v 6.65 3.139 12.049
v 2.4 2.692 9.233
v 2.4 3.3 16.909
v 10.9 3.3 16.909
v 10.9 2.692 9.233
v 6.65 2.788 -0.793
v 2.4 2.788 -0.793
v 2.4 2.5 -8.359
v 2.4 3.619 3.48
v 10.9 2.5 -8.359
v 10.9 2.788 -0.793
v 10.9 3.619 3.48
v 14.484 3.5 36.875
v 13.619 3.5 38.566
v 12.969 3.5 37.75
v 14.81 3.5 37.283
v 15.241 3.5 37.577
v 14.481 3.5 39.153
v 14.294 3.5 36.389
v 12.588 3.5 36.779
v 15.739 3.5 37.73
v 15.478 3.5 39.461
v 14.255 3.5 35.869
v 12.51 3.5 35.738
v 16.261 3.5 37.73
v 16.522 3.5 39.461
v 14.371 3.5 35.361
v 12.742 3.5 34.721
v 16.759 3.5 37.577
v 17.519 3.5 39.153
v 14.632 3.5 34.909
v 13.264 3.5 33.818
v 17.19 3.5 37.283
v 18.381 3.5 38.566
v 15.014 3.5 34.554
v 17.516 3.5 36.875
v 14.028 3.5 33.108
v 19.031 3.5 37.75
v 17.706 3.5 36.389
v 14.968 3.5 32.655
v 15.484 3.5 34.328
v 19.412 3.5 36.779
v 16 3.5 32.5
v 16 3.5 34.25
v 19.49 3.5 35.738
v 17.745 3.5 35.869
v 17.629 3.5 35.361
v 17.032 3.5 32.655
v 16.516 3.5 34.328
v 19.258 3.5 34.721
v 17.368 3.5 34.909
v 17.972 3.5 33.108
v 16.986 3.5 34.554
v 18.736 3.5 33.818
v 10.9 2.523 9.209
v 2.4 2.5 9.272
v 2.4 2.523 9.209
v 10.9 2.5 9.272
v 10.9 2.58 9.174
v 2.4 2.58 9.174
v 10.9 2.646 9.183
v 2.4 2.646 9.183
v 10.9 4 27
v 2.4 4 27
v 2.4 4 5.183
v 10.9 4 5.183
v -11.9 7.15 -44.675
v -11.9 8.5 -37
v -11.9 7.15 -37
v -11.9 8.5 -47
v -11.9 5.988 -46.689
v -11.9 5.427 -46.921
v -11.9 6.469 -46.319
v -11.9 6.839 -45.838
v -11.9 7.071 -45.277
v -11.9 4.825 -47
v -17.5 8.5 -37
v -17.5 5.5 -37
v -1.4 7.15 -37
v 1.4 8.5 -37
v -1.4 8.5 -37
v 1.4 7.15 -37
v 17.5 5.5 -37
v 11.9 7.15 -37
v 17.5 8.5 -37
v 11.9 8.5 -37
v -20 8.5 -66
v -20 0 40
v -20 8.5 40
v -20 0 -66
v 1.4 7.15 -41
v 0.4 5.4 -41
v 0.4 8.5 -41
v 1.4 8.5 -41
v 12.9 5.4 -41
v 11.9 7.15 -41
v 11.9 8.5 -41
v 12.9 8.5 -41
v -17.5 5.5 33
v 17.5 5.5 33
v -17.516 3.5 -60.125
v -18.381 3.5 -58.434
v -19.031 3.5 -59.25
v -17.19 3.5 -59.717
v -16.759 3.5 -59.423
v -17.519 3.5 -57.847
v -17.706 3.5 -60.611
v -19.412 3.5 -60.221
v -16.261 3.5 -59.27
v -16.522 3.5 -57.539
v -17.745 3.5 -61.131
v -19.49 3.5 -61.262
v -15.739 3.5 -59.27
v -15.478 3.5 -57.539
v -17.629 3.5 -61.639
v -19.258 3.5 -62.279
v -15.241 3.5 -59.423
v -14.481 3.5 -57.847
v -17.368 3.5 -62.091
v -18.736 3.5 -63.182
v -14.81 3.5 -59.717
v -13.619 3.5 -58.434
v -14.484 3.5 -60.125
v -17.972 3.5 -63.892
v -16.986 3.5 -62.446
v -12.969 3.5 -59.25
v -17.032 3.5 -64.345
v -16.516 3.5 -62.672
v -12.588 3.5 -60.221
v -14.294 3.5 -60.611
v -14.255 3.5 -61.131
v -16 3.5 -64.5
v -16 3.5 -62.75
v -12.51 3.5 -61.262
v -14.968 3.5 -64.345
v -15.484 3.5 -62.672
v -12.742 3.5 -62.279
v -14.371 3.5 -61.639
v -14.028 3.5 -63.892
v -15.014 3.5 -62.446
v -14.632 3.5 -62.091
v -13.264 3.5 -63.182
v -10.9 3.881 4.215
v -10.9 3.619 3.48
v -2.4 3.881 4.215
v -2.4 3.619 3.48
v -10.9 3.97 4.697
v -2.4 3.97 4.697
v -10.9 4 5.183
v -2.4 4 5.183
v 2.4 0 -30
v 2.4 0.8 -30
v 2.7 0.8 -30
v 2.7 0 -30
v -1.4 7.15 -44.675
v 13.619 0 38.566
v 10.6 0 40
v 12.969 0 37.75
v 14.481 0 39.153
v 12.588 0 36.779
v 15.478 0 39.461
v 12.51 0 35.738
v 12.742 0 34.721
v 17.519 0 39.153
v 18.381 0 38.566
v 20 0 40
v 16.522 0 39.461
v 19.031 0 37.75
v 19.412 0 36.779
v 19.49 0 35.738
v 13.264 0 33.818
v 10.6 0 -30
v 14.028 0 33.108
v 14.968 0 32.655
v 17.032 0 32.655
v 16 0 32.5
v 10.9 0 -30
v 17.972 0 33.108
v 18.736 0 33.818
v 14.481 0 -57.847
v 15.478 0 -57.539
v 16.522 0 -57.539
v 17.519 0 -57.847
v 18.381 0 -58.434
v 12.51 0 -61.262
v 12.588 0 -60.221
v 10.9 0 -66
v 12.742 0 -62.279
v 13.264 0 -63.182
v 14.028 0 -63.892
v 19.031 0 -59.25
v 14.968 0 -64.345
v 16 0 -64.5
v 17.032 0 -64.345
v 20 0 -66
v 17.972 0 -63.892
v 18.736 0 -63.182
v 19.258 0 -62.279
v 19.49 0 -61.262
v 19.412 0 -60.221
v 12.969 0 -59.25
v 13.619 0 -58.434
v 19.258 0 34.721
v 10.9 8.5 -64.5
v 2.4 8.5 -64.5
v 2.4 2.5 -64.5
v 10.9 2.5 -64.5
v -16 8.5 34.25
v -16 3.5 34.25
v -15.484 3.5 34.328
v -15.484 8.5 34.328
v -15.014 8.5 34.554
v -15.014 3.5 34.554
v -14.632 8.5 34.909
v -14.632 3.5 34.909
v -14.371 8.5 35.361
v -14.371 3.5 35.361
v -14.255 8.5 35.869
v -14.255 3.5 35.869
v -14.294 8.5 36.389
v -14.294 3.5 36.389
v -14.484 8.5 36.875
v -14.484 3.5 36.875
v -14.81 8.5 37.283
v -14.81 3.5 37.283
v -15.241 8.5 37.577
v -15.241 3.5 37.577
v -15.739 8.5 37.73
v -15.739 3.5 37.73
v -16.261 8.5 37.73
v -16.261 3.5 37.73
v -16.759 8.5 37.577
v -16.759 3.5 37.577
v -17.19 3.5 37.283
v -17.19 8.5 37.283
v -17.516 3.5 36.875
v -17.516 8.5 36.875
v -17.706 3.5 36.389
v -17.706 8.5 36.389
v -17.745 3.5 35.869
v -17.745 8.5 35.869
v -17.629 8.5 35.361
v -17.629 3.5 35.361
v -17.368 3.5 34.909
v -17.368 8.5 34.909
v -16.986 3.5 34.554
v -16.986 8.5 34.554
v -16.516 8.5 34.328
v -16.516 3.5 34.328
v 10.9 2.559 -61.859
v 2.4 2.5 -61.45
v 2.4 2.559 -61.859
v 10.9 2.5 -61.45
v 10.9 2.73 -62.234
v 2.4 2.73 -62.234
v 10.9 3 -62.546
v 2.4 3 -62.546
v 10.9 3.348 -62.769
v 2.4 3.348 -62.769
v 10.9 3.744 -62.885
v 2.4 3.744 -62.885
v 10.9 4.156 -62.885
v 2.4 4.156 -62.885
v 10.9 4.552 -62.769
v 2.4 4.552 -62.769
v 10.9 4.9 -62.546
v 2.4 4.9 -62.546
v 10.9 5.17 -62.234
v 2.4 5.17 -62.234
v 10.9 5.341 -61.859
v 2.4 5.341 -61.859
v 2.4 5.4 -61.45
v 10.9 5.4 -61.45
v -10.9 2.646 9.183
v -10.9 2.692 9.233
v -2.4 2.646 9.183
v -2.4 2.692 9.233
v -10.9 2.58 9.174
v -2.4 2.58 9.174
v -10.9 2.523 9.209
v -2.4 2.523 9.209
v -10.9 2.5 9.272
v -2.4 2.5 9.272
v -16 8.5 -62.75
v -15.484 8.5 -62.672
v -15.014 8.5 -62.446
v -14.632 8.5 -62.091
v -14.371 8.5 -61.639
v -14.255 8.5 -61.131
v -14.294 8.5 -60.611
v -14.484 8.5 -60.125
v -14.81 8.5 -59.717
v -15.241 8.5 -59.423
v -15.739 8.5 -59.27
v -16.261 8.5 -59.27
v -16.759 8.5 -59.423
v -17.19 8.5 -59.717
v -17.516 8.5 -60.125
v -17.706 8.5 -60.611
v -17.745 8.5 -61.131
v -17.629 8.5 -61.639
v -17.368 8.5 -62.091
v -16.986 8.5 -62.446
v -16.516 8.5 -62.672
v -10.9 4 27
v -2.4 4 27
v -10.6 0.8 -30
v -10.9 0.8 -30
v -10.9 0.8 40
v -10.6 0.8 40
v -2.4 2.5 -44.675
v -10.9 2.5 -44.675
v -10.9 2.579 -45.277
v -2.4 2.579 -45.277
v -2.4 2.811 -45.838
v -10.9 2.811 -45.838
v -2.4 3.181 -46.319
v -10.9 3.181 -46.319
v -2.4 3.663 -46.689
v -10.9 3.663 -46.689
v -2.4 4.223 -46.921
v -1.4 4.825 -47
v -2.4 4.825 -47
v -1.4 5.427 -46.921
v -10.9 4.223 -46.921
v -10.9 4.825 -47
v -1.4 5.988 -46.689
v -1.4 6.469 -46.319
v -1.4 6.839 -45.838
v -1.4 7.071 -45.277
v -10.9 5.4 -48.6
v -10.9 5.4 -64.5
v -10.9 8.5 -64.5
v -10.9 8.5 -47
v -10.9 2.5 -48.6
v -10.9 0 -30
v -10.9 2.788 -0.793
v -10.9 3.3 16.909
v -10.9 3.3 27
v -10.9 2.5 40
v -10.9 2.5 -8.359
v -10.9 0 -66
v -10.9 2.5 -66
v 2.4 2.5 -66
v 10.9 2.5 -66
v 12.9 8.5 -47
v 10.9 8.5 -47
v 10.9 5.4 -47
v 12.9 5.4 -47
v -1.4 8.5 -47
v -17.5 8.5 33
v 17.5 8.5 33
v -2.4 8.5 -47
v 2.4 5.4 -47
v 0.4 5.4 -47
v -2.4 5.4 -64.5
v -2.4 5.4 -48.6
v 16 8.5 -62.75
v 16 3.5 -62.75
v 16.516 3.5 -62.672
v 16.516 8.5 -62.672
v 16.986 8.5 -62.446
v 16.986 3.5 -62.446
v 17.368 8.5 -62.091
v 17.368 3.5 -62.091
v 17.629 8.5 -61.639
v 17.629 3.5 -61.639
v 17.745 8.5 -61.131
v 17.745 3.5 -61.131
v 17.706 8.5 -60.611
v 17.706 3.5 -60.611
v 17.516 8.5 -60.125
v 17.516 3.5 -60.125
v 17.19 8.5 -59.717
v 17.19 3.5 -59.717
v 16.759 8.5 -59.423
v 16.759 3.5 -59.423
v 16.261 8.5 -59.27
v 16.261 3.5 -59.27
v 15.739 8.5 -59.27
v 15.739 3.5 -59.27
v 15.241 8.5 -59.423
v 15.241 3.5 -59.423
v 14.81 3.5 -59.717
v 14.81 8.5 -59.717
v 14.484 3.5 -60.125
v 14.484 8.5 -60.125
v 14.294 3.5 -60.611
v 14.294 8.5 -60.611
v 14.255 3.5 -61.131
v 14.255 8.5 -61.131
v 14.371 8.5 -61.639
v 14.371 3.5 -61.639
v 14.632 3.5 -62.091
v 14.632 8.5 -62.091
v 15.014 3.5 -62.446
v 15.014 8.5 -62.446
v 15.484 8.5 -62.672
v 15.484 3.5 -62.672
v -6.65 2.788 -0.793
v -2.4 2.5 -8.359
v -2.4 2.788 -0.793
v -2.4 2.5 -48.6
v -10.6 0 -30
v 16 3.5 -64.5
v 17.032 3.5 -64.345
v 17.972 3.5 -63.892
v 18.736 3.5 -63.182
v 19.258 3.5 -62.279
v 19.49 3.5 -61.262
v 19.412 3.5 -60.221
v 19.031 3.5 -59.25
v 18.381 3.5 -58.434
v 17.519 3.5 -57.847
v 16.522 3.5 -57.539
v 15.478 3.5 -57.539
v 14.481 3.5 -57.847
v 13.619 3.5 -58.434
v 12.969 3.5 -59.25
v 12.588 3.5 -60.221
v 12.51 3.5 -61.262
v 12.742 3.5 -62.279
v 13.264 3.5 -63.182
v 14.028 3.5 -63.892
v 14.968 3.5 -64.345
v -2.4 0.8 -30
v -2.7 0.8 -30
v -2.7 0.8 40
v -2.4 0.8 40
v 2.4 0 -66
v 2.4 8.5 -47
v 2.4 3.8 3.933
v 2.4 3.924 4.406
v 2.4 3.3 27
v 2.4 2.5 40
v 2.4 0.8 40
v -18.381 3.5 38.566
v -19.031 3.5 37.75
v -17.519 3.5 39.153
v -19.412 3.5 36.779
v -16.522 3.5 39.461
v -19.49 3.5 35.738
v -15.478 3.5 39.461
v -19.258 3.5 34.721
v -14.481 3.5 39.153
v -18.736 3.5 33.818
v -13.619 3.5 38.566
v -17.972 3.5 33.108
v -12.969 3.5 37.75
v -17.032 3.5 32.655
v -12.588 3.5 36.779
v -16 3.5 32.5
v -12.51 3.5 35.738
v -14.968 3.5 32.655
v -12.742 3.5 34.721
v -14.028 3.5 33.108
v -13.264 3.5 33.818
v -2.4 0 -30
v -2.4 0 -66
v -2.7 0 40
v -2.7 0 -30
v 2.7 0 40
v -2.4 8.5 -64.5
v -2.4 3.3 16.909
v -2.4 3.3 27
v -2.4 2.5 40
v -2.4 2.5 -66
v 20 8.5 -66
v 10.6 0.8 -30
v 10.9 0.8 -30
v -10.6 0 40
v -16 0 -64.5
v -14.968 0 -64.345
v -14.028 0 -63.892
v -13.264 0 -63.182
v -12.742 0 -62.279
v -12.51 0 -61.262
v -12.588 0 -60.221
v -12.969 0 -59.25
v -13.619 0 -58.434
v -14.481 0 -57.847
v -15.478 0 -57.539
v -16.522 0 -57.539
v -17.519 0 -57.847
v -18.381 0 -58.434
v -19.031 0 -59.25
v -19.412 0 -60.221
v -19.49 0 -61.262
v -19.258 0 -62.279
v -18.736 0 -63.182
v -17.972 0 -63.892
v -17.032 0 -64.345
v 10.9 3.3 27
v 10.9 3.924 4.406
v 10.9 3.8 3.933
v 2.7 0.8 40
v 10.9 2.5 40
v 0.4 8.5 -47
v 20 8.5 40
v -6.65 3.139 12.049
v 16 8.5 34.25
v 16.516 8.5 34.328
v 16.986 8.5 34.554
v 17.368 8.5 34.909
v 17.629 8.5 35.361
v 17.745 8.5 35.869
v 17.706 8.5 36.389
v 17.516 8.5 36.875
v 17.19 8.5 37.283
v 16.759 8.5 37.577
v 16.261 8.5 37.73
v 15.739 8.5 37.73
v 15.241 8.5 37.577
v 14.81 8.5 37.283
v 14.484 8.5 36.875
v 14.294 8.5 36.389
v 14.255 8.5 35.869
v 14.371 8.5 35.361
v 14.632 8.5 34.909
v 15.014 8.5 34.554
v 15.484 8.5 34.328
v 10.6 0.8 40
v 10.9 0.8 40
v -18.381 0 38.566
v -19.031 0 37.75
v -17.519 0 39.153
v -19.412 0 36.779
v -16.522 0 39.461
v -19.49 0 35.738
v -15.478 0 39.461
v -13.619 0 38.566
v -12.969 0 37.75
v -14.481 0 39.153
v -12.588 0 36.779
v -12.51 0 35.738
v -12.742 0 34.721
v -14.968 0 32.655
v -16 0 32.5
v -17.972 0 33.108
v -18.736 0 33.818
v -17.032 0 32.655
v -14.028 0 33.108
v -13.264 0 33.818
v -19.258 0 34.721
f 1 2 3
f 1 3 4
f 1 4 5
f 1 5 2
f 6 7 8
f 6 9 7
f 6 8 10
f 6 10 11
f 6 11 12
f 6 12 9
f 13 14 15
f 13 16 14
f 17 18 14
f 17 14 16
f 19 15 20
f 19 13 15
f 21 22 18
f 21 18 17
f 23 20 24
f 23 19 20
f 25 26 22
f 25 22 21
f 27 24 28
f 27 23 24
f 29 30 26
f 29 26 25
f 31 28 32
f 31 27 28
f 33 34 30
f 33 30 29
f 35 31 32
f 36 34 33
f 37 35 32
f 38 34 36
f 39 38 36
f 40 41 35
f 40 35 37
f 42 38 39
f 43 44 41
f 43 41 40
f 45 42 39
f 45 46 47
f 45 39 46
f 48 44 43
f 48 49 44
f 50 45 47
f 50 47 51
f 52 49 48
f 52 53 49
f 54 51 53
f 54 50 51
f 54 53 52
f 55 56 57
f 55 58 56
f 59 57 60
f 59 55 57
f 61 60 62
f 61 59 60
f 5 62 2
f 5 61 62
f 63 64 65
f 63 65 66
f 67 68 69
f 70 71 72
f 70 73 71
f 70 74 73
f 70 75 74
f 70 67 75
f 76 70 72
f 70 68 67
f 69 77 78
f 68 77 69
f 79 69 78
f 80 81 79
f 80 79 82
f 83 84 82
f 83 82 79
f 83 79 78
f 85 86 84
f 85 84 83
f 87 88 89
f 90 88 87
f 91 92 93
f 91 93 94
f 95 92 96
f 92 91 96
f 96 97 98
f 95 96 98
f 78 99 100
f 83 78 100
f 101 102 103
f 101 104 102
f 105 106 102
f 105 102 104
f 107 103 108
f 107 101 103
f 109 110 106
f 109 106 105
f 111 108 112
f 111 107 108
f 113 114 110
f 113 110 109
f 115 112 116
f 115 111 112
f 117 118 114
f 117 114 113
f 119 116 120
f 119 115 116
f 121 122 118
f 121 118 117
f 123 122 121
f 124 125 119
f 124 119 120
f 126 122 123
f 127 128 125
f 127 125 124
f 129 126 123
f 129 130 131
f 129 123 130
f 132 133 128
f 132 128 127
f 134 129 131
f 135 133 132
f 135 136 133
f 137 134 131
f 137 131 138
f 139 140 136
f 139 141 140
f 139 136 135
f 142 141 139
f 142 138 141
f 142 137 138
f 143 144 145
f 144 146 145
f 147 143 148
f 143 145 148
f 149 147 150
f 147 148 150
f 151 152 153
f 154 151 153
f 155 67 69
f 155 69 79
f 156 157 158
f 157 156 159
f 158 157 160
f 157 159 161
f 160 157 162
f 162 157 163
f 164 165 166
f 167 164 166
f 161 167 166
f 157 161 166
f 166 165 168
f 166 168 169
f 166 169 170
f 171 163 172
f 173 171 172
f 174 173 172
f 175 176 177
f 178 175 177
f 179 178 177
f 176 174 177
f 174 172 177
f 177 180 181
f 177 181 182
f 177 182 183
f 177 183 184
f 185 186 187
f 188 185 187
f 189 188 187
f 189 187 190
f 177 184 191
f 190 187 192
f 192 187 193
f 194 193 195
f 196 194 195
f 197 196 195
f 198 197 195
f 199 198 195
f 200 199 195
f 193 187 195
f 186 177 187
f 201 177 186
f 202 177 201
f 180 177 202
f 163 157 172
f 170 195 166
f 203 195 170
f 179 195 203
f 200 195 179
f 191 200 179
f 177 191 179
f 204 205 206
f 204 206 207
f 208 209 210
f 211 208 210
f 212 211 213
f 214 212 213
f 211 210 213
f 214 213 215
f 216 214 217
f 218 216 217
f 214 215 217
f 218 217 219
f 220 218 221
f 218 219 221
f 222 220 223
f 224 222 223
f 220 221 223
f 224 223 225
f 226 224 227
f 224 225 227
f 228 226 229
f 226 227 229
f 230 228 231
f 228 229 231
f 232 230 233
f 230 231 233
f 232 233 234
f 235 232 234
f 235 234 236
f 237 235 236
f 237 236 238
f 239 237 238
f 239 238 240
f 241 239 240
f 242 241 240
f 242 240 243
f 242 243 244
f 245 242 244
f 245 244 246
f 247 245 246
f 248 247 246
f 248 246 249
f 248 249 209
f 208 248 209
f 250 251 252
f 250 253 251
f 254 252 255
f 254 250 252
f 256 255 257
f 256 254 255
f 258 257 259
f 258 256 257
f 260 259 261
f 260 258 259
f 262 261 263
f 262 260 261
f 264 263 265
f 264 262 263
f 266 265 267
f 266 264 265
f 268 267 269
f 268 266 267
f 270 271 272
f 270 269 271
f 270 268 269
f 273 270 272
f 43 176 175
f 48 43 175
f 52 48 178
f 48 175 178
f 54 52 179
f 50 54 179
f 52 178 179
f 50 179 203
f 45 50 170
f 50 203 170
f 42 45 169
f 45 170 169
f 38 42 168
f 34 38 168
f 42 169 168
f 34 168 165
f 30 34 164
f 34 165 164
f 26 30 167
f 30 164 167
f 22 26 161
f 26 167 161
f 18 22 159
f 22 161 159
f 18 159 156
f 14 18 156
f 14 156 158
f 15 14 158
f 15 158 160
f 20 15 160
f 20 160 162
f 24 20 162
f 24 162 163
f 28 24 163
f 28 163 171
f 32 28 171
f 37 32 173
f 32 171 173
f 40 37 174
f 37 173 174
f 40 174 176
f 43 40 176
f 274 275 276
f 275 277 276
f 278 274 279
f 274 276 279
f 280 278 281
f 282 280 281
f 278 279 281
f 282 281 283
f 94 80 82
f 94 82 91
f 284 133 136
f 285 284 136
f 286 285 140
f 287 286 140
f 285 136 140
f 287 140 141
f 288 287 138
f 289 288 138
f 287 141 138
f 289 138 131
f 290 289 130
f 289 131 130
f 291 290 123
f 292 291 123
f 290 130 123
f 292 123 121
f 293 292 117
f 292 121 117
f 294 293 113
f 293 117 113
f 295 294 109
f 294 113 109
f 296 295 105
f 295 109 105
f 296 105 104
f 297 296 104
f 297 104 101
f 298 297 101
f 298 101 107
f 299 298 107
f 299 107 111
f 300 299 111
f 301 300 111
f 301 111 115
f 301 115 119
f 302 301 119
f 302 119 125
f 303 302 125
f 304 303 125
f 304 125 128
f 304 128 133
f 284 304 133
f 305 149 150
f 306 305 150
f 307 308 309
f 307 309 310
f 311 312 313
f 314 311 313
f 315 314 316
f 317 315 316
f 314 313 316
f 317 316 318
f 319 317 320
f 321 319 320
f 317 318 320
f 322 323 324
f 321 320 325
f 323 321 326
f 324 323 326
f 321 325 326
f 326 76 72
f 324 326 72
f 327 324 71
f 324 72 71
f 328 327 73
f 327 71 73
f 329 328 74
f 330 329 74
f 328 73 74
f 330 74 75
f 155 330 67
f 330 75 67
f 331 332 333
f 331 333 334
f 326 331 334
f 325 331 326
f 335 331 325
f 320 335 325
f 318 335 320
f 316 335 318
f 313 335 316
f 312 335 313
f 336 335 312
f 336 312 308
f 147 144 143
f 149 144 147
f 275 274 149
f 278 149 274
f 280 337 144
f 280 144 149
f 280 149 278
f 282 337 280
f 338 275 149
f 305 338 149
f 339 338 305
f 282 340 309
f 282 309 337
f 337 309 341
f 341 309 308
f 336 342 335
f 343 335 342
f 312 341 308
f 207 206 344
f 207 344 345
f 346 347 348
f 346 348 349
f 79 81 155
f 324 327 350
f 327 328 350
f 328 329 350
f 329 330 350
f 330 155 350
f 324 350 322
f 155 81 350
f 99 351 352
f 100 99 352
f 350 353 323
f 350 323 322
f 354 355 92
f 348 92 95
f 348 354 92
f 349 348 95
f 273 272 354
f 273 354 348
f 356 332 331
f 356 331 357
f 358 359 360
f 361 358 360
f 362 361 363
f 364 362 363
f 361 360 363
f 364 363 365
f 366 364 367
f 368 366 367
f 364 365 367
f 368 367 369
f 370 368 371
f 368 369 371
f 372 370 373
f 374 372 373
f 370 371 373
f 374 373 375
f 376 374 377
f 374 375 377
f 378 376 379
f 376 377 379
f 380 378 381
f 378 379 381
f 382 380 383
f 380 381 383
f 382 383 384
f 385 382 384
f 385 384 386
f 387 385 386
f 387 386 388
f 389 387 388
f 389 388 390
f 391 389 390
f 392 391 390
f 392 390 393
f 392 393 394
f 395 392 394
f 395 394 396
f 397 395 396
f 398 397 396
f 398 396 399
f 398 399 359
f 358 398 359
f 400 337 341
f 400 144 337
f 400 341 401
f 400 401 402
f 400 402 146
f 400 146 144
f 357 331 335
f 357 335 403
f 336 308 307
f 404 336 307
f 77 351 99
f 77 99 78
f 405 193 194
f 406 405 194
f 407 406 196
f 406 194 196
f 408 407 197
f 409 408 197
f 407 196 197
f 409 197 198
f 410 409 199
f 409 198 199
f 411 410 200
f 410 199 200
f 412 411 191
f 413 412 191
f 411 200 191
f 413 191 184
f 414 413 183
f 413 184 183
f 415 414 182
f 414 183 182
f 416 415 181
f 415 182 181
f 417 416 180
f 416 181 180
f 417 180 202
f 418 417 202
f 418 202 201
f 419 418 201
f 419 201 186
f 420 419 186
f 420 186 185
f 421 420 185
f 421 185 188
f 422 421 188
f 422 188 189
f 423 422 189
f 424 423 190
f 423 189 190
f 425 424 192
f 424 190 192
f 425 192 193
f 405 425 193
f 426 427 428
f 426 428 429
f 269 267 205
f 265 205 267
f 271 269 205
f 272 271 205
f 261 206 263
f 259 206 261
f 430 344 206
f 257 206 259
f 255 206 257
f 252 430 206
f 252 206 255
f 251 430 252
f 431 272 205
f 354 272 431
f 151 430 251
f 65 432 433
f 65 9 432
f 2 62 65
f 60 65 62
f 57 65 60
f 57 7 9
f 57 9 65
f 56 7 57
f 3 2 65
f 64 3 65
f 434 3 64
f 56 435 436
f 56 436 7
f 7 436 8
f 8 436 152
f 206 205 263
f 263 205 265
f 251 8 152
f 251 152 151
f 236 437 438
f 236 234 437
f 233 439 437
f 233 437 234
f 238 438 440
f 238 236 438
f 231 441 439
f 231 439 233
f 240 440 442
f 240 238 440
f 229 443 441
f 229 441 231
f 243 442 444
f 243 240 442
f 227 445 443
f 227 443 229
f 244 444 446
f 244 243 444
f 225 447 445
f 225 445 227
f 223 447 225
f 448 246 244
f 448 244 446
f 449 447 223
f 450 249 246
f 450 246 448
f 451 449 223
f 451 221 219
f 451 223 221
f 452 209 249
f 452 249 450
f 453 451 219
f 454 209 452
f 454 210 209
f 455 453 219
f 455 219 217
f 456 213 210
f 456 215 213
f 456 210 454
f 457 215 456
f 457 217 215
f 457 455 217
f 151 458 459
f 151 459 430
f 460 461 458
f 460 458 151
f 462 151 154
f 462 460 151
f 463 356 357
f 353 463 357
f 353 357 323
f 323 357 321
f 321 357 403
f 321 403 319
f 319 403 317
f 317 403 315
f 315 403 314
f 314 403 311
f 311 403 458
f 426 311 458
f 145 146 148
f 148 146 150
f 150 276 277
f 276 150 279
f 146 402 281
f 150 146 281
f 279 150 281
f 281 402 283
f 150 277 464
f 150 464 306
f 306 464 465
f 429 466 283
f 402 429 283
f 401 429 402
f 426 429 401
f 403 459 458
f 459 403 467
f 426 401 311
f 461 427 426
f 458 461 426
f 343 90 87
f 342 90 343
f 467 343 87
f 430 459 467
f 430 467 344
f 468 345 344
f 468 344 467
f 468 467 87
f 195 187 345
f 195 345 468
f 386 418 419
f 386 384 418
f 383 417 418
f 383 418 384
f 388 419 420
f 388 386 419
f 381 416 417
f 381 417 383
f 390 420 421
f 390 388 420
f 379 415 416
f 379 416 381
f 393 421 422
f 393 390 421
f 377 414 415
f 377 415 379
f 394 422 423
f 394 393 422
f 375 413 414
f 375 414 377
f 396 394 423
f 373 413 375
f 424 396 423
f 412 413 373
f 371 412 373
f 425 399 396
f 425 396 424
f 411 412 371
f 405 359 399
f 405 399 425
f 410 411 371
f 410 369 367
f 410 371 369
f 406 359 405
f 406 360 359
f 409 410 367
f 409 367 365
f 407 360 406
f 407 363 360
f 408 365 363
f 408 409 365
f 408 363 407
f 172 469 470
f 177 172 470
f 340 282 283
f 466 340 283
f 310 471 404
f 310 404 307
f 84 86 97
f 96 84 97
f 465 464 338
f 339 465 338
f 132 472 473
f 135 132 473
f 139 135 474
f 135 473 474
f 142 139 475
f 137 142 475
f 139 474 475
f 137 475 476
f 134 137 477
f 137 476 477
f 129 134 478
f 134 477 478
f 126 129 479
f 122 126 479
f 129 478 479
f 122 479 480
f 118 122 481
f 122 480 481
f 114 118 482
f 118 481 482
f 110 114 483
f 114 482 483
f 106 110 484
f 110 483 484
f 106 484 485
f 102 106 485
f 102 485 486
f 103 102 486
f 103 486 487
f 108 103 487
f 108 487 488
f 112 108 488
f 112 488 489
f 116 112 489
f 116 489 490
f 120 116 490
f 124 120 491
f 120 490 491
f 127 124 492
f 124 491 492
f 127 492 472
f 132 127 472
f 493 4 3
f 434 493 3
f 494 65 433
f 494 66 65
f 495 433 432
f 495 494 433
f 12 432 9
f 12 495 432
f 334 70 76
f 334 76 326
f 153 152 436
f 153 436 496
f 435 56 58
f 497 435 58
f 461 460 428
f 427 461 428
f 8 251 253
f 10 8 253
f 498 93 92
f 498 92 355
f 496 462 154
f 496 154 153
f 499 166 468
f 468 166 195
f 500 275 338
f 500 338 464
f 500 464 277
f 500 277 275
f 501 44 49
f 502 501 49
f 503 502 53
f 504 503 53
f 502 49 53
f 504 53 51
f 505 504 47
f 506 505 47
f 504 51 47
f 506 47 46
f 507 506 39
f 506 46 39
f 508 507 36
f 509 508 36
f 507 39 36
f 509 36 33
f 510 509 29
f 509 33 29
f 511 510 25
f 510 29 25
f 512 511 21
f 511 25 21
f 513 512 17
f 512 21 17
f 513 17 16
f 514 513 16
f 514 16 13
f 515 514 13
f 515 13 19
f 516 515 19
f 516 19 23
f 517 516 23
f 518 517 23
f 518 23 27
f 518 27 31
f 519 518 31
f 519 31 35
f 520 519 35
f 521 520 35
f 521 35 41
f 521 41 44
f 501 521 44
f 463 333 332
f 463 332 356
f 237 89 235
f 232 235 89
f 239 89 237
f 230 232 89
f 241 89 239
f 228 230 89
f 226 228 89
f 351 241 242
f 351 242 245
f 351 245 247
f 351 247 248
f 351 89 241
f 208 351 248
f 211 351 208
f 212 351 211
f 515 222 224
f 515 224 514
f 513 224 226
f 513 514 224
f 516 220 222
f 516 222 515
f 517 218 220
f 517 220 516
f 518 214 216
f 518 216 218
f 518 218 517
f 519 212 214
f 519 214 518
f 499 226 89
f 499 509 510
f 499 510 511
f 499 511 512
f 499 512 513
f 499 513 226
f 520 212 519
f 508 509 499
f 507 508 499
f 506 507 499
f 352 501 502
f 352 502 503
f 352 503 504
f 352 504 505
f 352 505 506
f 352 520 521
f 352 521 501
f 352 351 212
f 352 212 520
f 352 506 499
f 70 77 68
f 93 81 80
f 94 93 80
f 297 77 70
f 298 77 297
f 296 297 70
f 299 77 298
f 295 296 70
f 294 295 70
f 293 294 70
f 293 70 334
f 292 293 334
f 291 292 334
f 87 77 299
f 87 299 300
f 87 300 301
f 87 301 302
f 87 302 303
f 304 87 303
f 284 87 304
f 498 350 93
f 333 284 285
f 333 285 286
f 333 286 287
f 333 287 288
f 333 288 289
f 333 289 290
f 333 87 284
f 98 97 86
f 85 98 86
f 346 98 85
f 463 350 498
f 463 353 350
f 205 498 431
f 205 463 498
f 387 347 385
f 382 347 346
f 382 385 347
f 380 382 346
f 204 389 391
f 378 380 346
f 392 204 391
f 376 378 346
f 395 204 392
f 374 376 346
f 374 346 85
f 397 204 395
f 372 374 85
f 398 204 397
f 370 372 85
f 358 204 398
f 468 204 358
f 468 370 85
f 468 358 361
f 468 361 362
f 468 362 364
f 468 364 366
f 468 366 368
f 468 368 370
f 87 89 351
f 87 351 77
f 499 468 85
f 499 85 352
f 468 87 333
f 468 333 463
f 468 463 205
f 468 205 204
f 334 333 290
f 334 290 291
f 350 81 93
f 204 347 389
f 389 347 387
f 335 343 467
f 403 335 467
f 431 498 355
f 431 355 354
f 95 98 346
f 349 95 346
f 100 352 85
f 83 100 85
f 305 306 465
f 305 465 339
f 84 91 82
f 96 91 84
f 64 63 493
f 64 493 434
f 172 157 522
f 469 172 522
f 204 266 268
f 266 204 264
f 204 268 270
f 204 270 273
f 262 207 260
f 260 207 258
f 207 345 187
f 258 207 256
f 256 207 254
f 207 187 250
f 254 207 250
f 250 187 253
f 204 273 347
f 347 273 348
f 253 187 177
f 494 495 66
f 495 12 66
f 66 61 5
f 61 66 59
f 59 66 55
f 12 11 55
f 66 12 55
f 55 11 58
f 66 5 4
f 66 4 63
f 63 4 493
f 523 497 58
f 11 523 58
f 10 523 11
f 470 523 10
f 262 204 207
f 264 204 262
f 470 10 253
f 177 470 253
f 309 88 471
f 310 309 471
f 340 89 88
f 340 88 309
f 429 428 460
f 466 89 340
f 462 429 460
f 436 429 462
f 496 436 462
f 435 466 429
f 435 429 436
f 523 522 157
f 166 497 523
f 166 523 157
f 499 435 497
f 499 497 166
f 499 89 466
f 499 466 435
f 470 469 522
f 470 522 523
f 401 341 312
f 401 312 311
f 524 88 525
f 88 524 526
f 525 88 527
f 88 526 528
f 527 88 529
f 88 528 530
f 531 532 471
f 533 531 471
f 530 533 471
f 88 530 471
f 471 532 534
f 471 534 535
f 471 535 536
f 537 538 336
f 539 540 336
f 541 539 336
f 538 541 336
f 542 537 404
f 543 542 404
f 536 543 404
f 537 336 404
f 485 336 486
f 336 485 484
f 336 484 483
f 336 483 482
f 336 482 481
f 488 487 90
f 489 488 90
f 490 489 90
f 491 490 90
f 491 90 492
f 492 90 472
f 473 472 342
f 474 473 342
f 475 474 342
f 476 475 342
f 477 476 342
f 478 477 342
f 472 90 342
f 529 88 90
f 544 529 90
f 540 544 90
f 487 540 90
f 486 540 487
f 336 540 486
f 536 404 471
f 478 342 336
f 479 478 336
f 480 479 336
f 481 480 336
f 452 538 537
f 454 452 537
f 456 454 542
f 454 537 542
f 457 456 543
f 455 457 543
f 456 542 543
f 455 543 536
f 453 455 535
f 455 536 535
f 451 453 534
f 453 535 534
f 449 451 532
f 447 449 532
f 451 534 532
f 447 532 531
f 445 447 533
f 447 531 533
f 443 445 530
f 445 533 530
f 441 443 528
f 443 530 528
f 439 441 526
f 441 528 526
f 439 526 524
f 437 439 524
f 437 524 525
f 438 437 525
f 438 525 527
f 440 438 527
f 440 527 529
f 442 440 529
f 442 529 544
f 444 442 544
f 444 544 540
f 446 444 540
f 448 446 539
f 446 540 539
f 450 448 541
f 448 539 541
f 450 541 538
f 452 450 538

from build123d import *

# Parameters (mm, degrees)
SKETCH1_W                  = 40
SKETCH1_H                  = 106
BOSS_EXTRUDE1_DEPTH        = 8.5
SKETCH2_W                  = 35
SKETCH2_H                  = 70
CUT_EXTRUDE1_DEPTH         = 3
SKETCH3_W                  = 10.5
SKETCH3_H                  = 10
CUT_EXTRUDE2_DEPTH         = 1.35
SKETCH4_W                  = 12.5
SKETCH4_H                  = 6
CUT_EXTRUDE3_DEPTH         = 3.1
SKETCH5_W                  = 8.5
SKETCH5_H                  = 17.5
PCB_PLACE_DEPTH            = 3.1
SKETCH6_W                  = 8.5
SKETCH6_H                  = 1.6
NICKEL_STRIP_HOLE_DEPTH    = 70.174850921
CUT_EXTRUDE4_REACH         = 71.486
SKETCH7_W                  = 8.5
SKETCH7_H                  = 17.5
SKETCH8_W                  = 8.5
SKETCH8_H                  = 1.6
CUT_EXTRUDE5_DEPTH         = 10
SKETCH9_W                  = 8.5
SKETCH9_H                  = 106
NICKEL_STRIP_RAIL_DEPTH    = 2.5
FILLET3_R                  = 2.325
FILLET4_RADIUS             = 1.45
FILLET4_LENGTH             = 8.5
SKETCH10_W                 = 8.5
SKETCH10_H                 = 5
CUT_EXTRUDE6_DEPTH         = 1.5
SKETCH11_W                 = 8.5
SKETCH11_H                 = 0.7
NICKELSTRIPINSERTION_DEPTH = 18
FILLET5_INSERTION_START    = -10.9
FILLET5_INSERTION_DEPTH    = 8.5
FILLET5_INSERTION_START_2  = 2.4
FILLET5_INSERTION_2_DEPTH  = 8.5
FILLET7_AMEND_R            = 4
FILLET6_START              = -10.9
FILLET6_DEPTH              = 8.5
FILLET6_START_2            = 2.4
FILLET6_2_DEPTH            = 8.5
FILLET8_ROUNDING_R         = 0.1
SKETCH12_W                 = 0.3
SKETCH12_H                 = 0.8
STRIPRAIL_DEPTH            = 70
SKETCH13_R                 = 1.75
SCREW_HOLES_DEPTH          = 70.485610128
SKETCH14_R                 = 3.5
SCREW_HEAD_HOLES_TBM_DEPTH = 3.5


with BuildPart() as part:
    # Sketch1 → Boss-Extrude1 (new body)
    with BuildSketch(Plane(origin=(0, 0, 0), x_dir=(1, 0, 0), z_dir=(0, 1, 0))):
        with Locations((0, 13)):
            Rectangle(SKETCH1_W, SKETCH1_H)
    extrude(amount=BOSS_EXTRUDE1_DEPTH)

    # Sketch2 → Cut-Extrude1 (cut)
    with BuildSketch(Plane(origin=(0, 8.5, 0), x_dir=(1, 0, 0), z_dir=(0, 1, 0))):
        with Locations((0, 2)):
            Rectangle(SKETCH2_W, SKETCH2_H)
    extrude(amount=-CUT_EXTRUDE1_DEPTH, mode=Mode.SUBTRACT)

    # Sketch3 → Cut-Extrude2 (cut)
    with BuildSketch(Plane(origin=(0, 8.5, 0), x_dir=(1, 0, 0), z_dir=(0, 1, 0))):
        with Locations((-6.65, 42)):
            Rectangle(SKETCH3_W, SKETCH3_H)
        with Locations((6.65, 42)):
            Rectangle(SKETCH3_W, SKETCH3_H)
    extrude(amount=-CUT_EXTRUDE2_DEPTH, mode=Mode.SUBTRACT)

    # Sketch4 → Cut-Extrude3 (cut)
    with BuildSketch(Plane(origin=(0, 8.5, 0), x_dir=(1, 0, 0), z_dir=(0, 1, 0))):
        with Locations((6.65, 44)):
            Rectangle(SKETCH4_W, SKETCH4_H)
    extrude(amount=-CUT_EXTRUDE3_DEPTH, mode=Mode.SUBTRACT)

    # Sketch5 → PCB place (cut)
    with BuildSketch(Plane(origin=(0, 8.5, 0), x_dir=(1, 0, 0), z_dir=(0, 1, 0))):
        with Locations((6.65, 55.75)):
            Rectangle(SKETCH5_W, SKETCH5_H)
    extrude(amount=-PCB_PLACE_DEPTH, mode=Mode.SUBTRACT)

    # Sketch6 → Nickel strip hole (cut, through all)
    with BuildSketch(Plane(origin=(0, 5.4, 0), x_dir=(1, 0, 0), z_dir=(0, 1, 0))):
        with Locations((6.65, 63.7)):
            Rectangle(SKETCH6_W, SKETCH6_H)
    extrude(amount=-NICKEL_STRIP_HOLE_DEPTH, mode=Mode.SUBTRACT)

    # Cut-Extrude4: up to this face of the body (flat: up to its plane)
    cut_extrude4_end = Plane(part.part.faces().sort_by_distance((6.65, 5.4, -51.042077088))[0])
    # Sketch7 → Cut-Extrude4 (cut, up to the picked face)
    with BuildSketch(Plane(origin=(0, 8.5, 0), x_dir=(1, 0, 0), z_dir=(0, 1, 0)), mode=Mode.PRIVATE) as cut_extrude4_sk1:
        with Locations((-6.65, 55.75)):
            Rectangle(SKETCH7_W, SKETCH7_H)
    cut_extrude4_tool1 = split(extrude(cut_extrude4_sk1.sketch, amount=-CUT_EXTRUDE4_REACH, mode=Mode.PRIVATE), bisect_by=cut_extrude4_end, keep=Keep.BOTH, mode=Mode.PRIVATE)
    add(cut_extrude4_tool1.solids().sort_by(Axis((-6.65, 8.5, -55.75), (0, -1, 0)))[0], mode=Mode.SUBTRACT)

    # Sketch8 → Cut-Extrude5 (cut)
    with BuildSketch(Plane(origin=(0, 5.4, 0), x_dir=(1, 0, 0), z_dir=(0, 1, 0))):
        with Locations((-6.65, 47.8)):
            Rectangle(SKETCH8_W, SKETCH8_H)
    extrude(amount=-CUT_EXTRUDE5_DEPTH, mode=Mode.SUBTRACT)

    # Sketch9 → Nickel strip rail (cut)
    with BuildSketch(Plane.XZ):
        with Locations((-6.65, -13)):
            Rectangle(SKETCH9_W, SKETCH9_H)
        with Locations((6.65, -13)):
            Rectangle(SKETCH9_W, SKETCH9_H)
    extrude(amount=-NICKEL_STRIP_RAIL_DEPTH, mode=Mode.SUBTRACT)

    # Fillet3
    # the kernel refuses this fillet: 2.325 mm, written as the material it takes off along each edge
    with BuildSketch(Plane(origin=(3.4125, 7.15, -47), x_dir=(0, 0, 1), z_dir=(-1, 0, 0))) as fillet3_piece_1_section:
        with BuildLine():
            CenterArc((FILLET3_R, -FILLET3_R), FILLET3_R, 90, 90)
            Line((0, -FILLET3_R), (0, 0))
            Line((0, 0), (FILLET3_R, 0))
        make_face()
    fillet3_piece_1 = extrude(amount=20.125, mode=Mode.PRIVATE)
    fillet3_piece_1 = split(fillet3_piece_1, bisect_by=Plane(origin=(-11.9, 7.15, -47), z_dir=(1, 0, 0)), keep=Keep.TOP, mode=Mode.PRIVATE)
    fillet3_piece_1 = split(fillet3_piece_1, bisect_by=Plane(origin=(-1.4, 7.15, -47), z_dir=(-1, 0, 0)), keep=Keep.TOP, mode=Mode.PRIVATE)
    add(fillet3_piece_1, mode=Mode.SUBTRACT)
    with BuildSketch(Plane(origin=(-10.9, 2.5, -47), x_dir=(0, 1, 0), z_dir=(1, 0, 0))) as fillet3_piece_2:
        with BuildLine():
            CenterArc((FILLET3_R, FILLET3_R), FILLET3_R, 180, 90)
            Line((0, FILLET3_R), (0, 0))
            Line((0, 0), (FILLET3_R, 0))
        make_face()
    extrude(amount=8.5, mode=Mode.SUBTRACT)

    # Fillet4: full round fillet: the end face becomes a half cylinder, R = half its width
    fillet4_face = Plane((6.65, 3.95, -62.9), x_dir=(1, 0, 0), z_dir=(0, 0, -1))  # on the end face: x along it, z out of the body
    fillet4_slab = fillet4_face.offset(-FILLET4_RADIUS / 2) * Box(FILLET4_LENGTH, 2 * FILLET4_RADIUS, FILLET4_RADIUS, mode=Mode.PRIVATE)  # the body's end, R deep
    fillet4_round = Plane((6.65, 3.95, -61.45), x_dir=(0, 0, -1), z_dir=(1, 0, 0)) * Cylinder(FILLET4_RADIUS, FILLET4_LENGTH, mode=Mode.PRIVATE)  # its axis R under the face
    add(fillet4_slab - fillet4_round, mode=Mode.SUBTRACT)

    # Sketch10 → Cut-Extrude6 (cut)
    with BuildSketch(Plane.XZ.offset(-2.5)):
        with Locations((6.65, 6.5)):
            Rectangle(SKETCH10_W, SKETCH10_H)
        with Locations((-6.65, 6.5)):
            Rectangle(SKETCH10_W, SKETCH10_H)
    extrude(amount=-CUT_EXTRUDE6_DEPTH, mode=Mode.SUBTRACT)

    # Sketch11 → NickelStripInsertion (cut)
    with BuildSketch(Plane(origin=(0, 0, 9), x_dir=(-1, 0, 0), z_dir=(0, 0, -1))):
        with Locations((-6.65, 3.65)):
            Rectangle(SKETCH11_W, SKETCH11_H)
        with Locations((6.65, 3.65)):
            Rectangle(SKETCH11_W, SKETCH11_H)
    extrude(amount=-NICKELSTRIPINSERTION_DEPTH, mode=Mode.SUBTRACT)

    # Fillet5_insertion: read off the stored shape, not the designer's step
    # Fillet5_insertion outline → Fillet5_insertion (cut)
    with BuildSketch(Plane.YZ.offset(FILLET5_INSERTION_START)):
        with BuildLine():
            Line((2.5, 4), (2.5, -8.359207094))
            add(Edge.make_bspline(
                [(2.5, -8.359207094), (2.5, 2.968380423), (4, 4)],
                knots=[0, 0, 0, 1, 1, 1], degree=2, weights=[1, 0.885061203, 1]))
            Line((4, 4), (2.5, 4))
        make_face()
    extrude(amount=FILLET5_INSERTION_DEPTH, mode=Mode.SUBTRACT)

    # Fillet5_insertion 2 outline → Fillet5_insertion 2 (cut)
    with BuildSketch(Plane.YZ.offset(FILLET5_INSERTION_START_2)):
        with BuildLine():
            Line((2.5, 4), (2.5, -8.359207094))
            add(Edge.make_bspline(
                [(2.5, -8.359207094), (2.5, 2.968380423), (4, 4)],
                knots=[0, 0, 0, 1, 1, 1], degree=2, weights=[1, 0.885061203, 1]))
            Line((4, 4), (2.5, 4))
        make_face()
    extrude(amount=FILLET5_INSERTION_2_DEPTH, mode=Mode.SUBTRACT)

    # Fillet7_amend
    fillet7_amend_edges = [part.edges().sort_by_distance(p)[0] for p in [
        (6.65, 4, 4),
        (-6.65, 4, 4),
    ]]
    fillet(fillet7_amend_edges, radius=FILLET7_AMEND_R)

    # Fillet6: read off the stored shape, not the designer's step
    # Fillet6 outline → Fillet6 (cut)
    with BuildSketch(Plane.YZ.offset(FILLET6_START)):
        with BuildLine():
            Line((3.3, 9), (3.3, 16.909487973))
            add(Edge.make_bspline(
                [(3.3, 16.909487973), (3.3, 9.121373217), (2.5, 9)],
                knots=[0, 0, 0, 1, 1, 1], degree=2, weights=[1, 0.758287544, 1]))
            Line((2.5, 9), (3.3, 9))
        make_face()
    extrude(amount=FILLET6_DEPTH, mode=Mode.SUBTRACT)

    # Fillet6 2 outline → Fillet6 2 (cut)
    with BuildSketch(Plane.YZ.offset(FILLET6_START_2)):
        with BuildLine():
            Line((3.3, 9), (3.3, 16.909487973))
            add(Edge.make_bspline(
                [(3.3, 16.909487973), (3.3, 9.121373217), (2.5, 9)],
                knots=[0, 0, 0, 1, 1, 1], degree=2, weights=[1, 0.758287544, 1]))
            Line((2.5, 9), (3.3, 9))
        make_face()
    extrude(amount=FILLET6_2_DEPTH, mode=Mode.SUBTRACT)

    # Fillet8_rounding
    fillet8_rounding_edges = [part.edges().sort_by_distance(p)[0] for p in [
        (-6.65, 2.5, 9),
        (6.65, 2.5, 9),
    ]]
    fillet(fillet8_rounding_edges, radius=FILLET8_ROUNDING_R)

    # Sketch12 → StripRail (add)
    with BuildSketch(Plane.XY.offset(40)):
        with Locations((2.55, 0.4)):
            Rectangle(SKETCH12_W, SKETCH12_H)
        with Locations((-10.75, 0.4)):
            Rectangle(SKETCH12_W, SKETCH12_H)
        with Locations((-2.55, 0.4)):
            Rectangle(SKETCH12_W, SKETCH12_H)
        with Locations((10.75, 0.4)):
            Rectangle(SKETCH12_W, SKETCH12_H)
    extrude(amount=-STRIPRAIL_DEPTH)

    # Sketch13 → Screw_Holes (cut, through all)
    with BuildSketch(Plane.XZ):
        with Locations(Location((-16, -61, 0), (0, 0, 270))):
            Circle(SKETCH13_R)
        with Locations(Location((16, -61, 0), (0, 0, 270))):
            Circle(SKETCH13_R)
        with Locations(Location((-16, 36, 0), (0, 0, 270))):
            Circle(SKETCH13_R)
        with Locations(Location((16, 36, 0), (0, 0, 270))):
            Circle(SKETCH13_R)
    extrude(amount=-SCREW_HOLES_DEPTH, mode=Mode.SUBTRACT)

    # Sketch14 → Screw_Head_Holes_TBM (cut)
    with BuildSketch(Plane.XZ):
        with Locations(Location((16, -61, 0), (0, 0, 270))):
            Circle(SKETCH14_R)
        with Locations(Location((-16, -61, 0), (0, 0, 270))):
            Circle(SKETCH14_R)
        with Locations(Location((16, 36, 0), (0, 0, 270))):
            Circle(SKETCH14_R)
        with Locations(Location((-16, 36, 0), (0, 0, 270))):
            Circle(SKETCH14_R)
    extrude(amount=-SCREW_HEAD_HOLES_TBM_DEPTH, mode=Mode.SUBTRACT)


solid = part.part
